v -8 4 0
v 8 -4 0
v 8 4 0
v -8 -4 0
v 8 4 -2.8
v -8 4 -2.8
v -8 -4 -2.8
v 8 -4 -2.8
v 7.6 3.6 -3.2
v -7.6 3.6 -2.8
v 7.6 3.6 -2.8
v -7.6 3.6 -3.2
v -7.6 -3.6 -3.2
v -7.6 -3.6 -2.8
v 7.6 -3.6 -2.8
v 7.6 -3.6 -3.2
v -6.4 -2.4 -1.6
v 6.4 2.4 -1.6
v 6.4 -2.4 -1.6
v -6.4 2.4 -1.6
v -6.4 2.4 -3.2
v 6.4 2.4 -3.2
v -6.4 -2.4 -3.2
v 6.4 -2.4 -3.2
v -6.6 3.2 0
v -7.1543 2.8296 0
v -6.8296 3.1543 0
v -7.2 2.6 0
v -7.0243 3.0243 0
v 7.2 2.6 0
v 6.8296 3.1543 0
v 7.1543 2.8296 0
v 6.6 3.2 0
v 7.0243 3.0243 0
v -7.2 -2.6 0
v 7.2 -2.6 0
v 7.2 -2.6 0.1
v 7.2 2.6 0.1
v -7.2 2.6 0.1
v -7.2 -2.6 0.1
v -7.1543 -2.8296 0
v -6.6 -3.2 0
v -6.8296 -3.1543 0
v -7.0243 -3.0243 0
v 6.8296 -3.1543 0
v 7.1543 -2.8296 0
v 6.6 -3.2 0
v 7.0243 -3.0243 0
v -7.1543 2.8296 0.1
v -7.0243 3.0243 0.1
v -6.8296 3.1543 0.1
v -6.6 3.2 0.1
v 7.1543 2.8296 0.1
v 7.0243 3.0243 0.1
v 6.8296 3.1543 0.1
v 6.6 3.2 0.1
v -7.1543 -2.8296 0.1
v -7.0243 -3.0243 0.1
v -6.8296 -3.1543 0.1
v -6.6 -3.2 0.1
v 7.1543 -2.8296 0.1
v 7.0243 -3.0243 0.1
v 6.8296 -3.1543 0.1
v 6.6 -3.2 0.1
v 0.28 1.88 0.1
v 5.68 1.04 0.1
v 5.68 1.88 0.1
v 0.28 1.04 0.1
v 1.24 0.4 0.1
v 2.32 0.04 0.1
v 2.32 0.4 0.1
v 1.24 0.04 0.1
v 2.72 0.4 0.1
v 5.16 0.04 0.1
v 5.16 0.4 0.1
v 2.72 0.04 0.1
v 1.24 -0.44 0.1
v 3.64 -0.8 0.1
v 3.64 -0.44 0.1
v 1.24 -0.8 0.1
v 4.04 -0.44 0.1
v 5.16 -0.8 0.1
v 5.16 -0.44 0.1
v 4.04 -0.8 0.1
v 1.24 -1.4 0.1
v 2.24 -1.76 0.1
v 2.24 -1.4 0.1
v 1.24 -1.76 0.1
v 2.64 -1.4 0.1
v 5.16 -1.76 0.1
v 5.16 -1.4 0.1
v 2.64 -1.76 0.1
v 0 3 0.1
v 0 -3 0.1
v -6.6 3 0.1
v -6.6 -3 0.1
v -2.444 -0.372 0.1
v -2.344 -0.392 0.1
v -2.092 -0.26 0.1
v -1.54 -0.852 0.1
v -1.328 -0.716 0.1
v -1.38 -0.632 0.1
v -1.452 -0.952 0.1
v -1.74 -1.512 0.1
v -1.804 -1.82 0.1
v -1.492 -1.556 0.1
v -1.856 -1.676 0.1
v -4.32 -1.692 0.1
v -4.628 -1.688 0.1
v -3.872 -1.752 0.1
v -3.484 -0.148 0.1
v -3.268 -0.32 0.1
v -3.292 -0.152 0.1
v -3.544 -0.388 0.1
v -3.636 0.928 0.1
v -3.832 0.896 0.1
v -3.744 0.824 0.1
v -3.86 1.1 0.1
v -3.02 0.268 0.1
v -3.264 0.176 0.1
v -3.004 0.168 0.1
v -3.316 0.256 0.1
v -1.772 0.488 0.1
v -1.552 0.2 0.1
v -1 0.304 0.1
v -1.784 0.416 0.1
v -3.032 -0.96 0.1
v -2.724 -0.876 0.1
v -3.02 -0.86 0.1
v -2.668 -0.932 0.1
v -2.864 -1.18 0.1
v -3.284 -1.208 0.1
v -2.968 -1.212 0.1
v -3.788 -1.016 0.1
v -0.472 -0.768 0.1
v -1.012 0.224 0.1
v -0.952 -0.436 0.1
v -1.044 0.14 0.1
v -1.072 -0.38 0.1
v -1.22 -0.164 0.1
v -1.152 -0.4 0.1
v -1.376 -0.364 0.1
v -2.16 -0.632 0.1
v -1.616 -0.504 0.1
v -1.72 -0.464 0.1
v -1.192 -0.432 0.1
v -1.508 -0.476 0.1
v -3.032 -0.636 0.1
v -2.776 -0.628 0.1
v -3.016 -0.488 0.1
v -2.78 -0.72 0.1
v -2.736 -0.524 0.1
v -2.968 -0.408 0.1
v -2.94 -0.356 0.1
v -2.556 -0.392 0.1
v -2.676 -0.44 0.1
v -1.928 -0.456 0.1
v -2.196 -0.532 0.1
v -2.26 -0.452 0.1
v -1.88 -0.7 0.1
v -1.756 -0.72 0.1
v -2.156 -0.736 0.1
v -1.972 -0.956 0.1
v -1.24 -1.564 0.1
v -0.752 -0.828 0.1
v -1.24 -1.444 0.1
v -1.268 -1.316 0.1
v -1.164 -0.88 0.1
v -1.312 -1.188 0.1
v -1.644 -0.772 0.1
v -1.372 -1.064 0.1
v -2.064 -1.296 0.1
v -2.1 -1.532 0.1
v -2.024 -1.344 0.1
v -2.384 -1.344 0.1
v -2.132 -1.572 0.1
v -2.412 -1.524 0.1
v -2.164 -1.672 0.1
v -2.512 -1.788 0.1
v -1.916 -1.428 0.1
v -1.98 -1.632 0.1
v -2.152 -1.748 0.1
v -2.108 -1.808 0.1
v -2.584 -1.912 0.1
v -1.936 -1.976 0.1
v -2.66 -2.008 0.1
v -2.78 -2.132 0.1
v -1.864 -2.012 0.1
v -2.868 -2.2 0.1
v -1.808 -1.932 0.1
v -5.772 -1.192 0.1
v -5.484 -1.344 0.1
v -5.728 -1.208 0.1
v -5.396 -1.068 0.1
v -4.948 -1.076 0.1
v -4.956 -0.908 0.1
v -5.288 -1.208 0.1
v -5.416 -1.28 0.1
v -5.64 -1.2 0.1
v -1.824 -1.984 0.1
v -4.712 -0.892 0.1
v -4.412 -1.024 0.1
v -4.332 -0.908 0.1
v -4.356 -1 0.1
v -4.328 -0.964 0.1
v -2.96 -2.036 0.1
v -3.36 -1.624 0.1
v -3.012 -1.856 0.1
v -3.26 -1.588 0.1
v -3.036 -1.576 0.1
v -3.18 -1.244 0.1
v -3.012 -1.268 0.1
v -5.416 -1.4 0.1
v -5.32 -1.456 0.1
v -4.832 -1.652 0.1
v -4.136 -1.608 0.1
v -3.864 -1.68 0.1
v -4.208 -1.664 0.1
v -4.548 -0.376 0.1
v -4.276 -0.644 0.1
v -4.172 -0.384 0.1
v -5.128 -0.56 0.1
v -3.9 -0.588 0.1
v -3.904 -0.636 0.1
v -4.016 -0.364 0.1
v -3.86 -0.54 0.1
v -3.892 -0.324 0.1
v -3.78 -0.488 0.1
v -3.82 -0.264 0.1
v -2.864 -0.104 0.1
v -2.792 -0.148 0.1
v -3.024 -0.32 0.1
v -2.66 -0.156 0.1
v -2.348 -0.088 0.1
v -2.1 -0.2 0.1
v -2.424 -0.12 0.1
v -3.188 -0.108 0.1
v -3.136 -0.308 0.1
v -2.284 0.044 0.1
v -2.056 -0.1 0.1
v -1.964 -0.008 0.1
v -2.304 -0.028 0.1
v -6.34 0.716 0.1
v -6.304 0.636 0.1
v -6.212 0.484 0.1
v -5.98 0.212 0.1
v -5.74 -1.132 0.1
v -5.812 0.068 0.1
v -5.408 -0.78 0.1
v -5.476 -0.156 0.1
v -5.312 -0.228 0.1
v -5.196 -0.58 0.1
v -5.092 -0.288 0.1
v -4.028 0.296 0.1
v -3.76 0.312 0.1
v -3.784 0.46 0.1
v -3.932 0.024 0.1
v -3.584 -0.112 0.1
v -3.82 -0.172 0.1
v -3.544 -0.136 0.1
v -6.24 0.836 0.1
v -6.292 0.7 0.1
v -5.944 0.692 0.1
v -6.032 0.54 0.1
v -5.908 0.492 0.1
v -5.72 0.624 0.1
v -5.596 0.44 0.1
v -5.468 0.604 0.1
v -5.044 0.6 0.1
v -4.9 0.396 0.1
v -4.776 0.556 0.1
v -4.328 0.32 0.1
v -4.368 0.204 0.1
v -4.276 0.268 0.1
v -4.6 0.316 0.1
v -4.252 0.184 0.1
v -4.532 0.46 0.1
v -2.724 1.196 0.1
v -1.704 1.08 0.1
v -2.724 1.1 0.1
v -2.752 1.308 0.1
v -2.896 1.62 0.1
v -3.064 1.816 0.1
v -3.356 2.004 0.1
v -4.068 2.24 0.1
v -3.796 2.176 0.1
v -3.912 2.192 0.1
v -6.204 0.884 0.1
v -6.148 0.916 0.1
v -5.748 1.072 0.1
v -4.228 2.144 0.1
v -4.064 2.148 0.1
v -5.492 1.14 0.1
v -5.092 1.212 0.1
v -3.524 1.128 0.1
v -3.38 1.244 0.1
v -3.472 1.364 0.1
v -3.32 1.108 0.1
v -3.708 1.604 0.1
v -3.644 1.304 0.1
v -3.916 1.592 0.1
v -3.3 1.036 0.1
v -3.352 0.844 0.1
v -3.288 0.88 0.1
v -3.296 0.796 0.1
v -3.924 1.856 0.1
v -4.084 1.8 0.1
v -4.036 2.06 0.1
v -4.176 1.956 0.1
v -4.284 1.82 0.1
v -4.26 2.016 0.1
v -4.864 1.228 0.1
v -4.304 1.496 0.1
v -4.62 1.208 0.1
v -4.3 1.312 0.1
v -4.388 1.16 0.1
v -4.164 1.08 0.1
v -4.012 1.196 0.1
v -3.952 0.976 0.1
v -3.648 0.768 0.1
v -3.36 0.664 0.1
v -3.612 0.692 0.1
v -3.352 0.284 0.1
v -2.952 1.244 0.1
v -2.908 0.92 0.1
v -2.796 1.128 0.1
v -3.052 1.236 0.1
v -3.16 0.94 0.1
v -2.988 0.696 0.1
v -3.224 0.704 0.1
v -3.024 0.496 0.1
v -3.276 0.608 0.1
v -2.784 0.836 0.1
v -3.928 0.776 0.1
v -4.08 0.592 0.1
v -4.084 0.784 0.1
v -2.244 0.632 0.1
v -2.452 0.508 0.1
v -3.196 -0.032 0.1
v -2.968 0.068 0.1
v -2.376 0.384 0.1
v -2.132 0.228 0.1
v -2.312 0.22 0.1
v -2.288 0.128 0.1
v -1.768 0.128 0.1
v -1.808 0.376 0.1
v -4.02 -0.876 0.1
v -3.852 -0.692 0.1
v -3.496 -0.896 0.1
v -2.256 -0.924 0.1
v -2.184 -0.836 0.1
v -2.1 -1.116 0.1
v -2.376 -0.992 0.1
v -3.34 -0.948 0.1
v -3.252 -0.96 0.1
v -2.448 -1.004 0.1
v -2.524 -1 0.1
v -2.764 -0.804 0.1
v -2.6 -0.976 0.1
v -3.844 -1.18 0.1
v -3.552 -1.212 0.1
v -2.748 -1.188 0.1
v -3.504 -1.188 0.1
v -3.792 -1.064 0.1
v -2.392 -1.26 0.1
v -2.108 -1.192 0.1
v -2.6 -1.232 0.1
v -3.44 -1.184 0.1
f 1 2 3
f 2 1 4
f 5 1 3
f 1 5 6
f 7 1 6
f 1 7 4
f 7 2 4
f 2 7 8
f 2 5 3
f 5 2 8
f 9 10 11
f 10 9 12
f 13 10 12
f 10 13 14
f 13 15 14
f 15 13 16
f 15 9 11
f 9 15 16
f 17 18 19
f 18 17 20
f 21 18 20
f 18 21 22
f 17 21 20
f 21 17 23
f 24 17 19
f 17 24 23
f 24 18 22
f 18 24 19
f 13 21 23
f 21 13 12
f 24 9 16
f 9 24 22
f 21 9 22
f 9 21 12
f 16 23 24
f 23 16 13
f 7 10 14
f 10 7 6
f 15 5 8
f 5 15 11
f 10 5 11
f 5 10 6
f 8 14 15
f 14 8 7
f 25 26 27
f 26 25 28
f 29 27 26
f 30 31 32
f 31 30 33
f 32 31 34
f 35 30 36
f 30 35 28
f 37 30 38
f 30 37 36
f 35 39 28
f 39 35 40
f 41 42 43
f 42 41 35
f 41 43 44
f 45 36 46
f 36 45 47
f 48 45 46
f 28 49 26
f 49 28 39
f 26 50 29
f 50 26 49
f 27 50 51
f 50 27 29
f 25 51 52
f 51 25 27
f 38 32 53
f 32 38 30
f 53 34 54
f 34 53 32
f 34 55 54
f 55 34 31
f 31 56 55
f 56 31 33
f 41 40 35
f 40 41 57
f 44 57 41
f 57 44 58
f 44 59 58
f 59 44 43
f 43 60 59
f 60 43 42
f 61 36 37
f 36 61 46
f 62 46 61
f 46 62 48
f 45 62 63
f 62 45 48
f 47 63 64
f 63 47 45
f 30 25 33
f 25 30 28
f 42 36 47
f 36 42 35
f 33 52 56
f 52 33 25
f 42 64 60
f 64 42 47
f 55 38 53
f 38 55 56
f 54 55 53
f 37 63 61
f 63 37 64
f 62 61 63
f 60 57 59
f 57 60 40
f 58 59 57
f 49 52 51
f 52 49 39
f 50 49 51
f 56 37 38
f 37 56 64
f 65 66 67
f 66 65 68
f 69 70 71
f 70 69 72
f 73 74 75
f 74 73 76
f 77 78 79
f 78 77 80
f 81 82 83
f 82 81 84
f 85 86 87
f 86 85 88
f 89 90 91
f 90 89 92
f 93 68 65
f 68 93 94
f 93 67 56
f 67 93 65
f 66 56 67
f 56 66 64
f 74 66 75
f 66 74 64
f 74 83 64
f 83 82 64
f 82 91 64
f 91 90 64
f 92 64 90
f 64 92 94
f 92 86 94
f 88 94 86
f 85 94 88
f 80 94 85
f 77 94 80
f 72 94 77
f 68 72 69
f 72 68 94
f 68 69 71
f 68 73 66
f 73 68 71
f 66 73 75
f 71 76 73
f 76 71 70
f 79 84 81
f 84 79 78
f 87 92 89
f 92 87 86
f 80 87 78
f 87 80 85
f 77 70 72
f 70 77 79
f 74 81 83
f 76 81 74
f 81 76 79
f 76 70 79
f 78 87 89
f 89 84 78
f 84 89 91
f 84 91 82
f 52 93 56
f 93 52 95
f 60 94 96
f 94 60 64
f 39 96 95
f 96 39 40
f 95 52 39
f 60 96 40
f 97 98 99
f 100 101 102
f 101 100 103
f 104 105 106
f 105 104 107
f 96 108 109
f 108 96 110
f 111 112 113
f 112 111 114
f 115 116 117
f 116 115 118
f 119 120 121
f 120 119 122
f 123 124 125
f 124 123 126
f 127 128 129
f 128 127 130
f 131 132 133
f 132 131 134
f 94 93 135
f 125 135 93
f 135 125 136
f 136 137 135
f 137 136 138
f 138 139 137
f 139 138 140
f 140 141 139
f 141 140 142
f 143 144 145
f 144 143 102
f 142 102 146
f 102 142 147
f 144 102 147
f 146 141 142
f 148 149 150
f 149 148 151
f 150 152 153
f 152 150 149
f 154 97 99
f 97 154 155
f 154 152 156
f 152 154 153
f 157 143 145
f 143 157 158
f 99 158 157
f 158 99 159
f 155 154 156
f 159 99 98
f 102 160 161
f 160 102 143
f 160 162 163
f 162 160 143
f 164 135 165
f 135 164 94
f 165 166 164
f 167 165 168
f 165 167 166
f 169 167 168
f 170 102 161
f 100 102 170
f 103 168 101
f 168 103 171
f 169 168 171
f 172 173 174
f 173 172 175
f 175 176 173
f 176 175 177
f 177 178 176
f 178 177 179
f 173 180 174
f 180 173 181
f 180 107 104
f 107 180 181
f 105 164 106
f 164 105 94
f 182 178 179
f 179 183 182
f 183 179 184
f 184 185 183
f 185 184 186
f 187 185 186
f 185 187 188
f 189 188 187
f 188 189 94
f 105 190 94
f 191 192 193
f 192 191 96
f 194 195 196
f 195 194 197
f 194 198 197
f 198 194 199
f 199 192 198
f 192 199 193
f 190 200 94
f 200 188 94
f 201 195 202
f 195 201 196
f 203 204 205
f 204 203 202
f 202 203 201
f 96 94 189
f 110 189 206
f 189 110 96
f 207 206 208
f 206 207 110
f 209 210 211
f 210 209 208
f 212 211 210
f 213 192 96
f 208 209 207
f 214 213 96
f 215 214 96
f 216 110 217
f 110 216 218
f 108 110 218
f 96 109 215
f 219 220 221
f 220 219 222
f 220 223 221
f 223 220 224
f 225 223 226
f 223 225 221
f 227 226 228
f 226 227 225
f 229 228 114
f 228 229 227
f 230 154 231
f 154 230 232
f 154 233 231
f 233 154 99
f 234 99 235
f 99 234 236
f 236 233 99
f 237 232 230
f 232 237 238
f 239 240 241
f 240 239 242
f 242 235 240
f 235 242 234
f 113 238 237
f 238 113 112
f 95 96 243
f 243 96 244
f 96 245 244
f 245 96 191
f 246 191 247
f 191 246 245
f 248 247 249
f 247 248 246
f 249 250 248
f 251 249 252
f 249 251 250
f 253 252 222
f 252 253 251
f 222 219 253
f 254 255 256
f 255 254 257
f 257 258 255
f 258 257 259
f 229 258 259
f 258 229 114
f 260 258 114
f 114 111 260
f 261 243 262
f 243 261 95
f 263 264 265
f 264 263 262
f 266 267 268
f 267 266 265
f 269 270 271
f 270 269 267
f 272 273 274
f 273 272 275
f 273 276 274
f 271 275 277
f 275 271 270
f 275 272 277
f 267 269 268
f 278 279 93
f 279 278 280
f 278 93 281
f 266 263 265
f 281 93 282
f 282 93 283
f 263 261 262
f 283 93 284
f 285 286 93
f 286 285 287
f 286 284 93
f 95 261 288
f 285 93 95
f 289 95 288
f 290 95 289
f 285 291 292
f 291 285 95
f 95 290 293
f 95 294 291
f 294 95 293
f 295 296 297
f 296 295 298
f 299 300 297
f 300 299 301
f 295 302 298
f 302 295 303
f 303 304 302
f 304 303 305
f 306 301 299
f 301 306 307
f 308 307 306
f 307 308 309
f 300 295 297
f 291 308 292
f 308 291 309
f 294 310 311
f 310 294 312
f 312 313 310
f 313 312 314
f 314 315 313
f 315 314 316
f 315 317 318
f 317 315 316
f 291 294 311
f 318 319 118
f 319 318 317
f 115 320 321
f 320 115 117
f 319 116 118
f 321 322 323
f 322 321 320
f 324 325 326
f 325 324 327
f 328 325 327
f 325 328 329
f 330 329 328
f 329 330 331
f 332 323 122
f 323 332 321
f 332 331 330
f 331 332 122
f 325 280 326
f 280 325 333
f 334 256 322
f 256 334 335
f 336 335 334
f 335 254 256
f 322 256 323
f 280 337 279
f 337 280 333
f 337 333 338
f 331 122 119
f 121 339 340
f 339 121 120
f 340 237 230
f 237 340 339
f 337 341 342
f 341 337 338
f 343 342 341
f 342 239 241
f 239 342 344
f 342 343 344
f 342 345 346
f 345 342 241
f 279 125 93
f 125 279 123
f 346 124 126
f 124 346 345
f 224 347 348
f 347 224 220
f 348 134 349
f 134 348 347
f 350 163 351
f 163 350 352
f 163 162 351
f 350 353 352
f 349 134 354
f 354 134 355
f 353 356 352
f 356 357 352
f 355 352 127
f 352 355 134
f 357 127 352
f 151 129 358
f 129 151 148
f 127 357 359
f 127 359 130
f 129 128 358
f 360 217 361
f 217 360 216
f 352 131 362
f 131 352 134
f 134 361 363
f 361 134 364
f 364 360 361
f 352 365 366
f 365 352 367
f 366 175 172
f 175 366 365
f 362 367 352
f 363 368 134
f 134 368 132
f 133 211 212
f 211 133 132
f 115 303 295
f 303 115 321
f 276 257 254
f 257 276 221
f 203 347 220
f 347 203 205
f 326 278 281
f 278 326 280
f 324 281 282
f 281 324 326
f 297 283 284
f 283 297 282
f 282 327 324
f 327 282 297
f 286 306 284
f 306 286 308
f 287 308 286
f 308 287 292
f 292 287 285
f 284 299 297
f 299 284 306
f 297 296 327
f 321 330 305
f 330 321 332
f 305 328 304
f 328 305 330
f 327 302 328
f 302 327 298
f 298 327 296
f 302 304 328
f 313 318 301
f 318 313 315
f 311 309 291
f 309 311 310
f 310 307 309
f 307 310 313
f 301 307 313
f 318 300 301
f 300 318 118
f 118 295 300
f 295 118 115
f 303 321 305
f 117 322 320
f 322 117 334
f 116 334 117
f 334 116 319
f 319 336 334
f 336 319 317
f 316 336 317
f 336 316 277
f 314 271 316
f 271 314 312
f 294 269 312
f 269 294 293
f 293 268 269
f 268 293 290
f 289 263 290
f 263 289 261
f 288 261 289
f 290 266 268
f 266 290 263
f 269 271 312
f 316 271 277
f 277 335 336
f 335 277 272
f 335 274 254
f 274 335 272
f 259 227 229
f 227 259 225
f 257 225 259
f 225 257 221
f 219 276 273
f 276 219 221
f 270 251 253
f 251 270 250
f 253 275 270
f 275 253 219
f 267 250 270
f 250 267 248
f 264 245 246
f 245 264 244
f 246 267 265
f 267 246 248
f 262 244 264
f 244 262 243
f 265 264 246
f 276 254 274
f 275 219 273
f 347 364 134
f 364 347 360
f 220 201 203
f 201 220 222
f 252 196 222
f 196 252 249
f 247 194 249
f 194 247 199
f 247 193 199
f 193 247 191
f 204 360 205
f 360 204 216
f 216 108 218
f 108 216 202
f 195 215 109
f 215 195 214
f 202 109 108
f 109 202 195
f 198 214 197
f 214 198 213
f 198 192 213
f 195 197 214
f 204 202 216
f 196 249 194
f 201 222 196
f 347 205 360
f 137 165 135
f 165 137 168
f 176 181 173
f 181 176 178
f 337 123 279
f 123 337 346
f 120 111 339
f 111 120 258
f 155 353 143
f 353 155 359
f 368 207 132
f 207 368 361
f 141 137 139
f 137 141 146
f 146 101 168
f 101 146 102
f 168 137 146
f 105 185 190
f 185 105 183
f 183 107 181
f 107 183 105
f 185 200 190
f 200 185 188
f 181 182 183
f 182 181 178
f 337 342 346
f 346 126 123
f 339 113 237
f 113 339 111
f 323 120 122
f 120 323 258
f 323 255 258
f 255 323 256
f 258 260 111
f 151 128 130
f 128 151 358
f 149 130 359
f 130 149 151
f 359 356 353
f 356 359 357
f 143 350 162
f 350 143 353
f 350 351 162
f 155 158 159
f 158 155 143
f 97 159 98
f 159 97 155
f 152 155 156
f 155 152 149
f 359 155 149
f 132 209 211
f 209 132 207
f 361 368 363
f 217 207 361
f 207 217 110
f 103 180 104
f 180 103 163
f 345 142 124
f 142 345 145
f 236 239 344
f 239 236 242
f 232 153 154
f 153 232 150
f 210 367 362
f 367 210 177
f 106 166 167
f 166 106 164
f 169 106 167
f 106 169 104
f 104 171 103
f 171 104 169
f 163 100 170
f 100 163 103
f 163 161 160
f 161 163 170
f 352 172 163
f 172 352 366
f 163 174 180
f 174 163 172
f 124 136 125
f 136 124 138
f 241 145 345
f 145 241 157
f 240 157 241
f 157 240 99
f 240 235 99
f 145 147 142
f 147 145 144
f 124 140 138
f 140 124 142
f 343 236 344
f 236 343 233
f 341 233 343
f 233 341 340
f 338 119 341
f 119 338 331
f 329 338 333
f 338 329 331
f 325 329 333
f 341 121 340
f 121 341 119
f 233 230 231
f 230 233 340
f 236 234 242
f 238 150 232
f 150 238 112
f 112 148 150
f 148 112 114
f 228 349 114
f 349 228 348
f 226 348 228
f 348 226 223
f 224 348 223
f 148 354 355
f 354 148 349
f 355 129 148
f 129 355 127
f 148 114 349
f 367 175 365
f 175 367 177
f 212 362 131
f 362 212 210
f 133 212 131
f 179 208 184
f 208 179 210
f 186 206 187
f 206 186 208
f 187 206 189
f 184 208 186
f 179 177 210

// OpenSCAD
use <../lib.scad>
use <3069b.scad>
use <6435269a.scad>
function ldraw_lib__3069bd18() = [
// 0 Tile  1 x  2 with Plumeria Sign Sticker
// 0 Name: 3069bd18.dat
// 0 Author: Philippe Hurbain [Philo]
// 0 !LDRAW_ORG Shortcut UPDATE 2025-08
// 0 !LICENSE Licensed under CC BY 4.0 : see CAreadme.txt
// 
// 0 BFC CERTIFY CCW
  [0,"BFC","CERTIFY"],
  [0,"BFC","CCW"],
// 
// 0 !CATEGORY Sticker Shortcut
// 0 !KEYWORDS Bricklink 41757stk01, Rebrickable 10109627, Set 41757
// 
// 0 !HISTORY 2025-08-31 [OrionP] Official Update 2025-08
// 
// 1 16 0 0 0 1 0 0 0 1 0 0 0 1 3069b.dat
  [1,16,0,0,0,1,0,0,0,1,0,0,0,1, ldraw_lib__3069b()],
// 1 16 0 0 0 1 0 0 0 1 0 0 0 1 6435269a.dat
  [1,16,0,0,0,1,0,0,0,1,0,0,0,1, ldraw_lib__6435269a()],
];
module ldraw_lib__3069bd18(step=0, col=false, unit=2/5, alt=false, line=0.2, solid=!$preview)
    makepoly(ldraw_lib__3069bd18(), step=step, col=col, unit=unit, alt=alt, line=line, solid=solid);
ldraw_lib__3069bd18(line=0.2);
